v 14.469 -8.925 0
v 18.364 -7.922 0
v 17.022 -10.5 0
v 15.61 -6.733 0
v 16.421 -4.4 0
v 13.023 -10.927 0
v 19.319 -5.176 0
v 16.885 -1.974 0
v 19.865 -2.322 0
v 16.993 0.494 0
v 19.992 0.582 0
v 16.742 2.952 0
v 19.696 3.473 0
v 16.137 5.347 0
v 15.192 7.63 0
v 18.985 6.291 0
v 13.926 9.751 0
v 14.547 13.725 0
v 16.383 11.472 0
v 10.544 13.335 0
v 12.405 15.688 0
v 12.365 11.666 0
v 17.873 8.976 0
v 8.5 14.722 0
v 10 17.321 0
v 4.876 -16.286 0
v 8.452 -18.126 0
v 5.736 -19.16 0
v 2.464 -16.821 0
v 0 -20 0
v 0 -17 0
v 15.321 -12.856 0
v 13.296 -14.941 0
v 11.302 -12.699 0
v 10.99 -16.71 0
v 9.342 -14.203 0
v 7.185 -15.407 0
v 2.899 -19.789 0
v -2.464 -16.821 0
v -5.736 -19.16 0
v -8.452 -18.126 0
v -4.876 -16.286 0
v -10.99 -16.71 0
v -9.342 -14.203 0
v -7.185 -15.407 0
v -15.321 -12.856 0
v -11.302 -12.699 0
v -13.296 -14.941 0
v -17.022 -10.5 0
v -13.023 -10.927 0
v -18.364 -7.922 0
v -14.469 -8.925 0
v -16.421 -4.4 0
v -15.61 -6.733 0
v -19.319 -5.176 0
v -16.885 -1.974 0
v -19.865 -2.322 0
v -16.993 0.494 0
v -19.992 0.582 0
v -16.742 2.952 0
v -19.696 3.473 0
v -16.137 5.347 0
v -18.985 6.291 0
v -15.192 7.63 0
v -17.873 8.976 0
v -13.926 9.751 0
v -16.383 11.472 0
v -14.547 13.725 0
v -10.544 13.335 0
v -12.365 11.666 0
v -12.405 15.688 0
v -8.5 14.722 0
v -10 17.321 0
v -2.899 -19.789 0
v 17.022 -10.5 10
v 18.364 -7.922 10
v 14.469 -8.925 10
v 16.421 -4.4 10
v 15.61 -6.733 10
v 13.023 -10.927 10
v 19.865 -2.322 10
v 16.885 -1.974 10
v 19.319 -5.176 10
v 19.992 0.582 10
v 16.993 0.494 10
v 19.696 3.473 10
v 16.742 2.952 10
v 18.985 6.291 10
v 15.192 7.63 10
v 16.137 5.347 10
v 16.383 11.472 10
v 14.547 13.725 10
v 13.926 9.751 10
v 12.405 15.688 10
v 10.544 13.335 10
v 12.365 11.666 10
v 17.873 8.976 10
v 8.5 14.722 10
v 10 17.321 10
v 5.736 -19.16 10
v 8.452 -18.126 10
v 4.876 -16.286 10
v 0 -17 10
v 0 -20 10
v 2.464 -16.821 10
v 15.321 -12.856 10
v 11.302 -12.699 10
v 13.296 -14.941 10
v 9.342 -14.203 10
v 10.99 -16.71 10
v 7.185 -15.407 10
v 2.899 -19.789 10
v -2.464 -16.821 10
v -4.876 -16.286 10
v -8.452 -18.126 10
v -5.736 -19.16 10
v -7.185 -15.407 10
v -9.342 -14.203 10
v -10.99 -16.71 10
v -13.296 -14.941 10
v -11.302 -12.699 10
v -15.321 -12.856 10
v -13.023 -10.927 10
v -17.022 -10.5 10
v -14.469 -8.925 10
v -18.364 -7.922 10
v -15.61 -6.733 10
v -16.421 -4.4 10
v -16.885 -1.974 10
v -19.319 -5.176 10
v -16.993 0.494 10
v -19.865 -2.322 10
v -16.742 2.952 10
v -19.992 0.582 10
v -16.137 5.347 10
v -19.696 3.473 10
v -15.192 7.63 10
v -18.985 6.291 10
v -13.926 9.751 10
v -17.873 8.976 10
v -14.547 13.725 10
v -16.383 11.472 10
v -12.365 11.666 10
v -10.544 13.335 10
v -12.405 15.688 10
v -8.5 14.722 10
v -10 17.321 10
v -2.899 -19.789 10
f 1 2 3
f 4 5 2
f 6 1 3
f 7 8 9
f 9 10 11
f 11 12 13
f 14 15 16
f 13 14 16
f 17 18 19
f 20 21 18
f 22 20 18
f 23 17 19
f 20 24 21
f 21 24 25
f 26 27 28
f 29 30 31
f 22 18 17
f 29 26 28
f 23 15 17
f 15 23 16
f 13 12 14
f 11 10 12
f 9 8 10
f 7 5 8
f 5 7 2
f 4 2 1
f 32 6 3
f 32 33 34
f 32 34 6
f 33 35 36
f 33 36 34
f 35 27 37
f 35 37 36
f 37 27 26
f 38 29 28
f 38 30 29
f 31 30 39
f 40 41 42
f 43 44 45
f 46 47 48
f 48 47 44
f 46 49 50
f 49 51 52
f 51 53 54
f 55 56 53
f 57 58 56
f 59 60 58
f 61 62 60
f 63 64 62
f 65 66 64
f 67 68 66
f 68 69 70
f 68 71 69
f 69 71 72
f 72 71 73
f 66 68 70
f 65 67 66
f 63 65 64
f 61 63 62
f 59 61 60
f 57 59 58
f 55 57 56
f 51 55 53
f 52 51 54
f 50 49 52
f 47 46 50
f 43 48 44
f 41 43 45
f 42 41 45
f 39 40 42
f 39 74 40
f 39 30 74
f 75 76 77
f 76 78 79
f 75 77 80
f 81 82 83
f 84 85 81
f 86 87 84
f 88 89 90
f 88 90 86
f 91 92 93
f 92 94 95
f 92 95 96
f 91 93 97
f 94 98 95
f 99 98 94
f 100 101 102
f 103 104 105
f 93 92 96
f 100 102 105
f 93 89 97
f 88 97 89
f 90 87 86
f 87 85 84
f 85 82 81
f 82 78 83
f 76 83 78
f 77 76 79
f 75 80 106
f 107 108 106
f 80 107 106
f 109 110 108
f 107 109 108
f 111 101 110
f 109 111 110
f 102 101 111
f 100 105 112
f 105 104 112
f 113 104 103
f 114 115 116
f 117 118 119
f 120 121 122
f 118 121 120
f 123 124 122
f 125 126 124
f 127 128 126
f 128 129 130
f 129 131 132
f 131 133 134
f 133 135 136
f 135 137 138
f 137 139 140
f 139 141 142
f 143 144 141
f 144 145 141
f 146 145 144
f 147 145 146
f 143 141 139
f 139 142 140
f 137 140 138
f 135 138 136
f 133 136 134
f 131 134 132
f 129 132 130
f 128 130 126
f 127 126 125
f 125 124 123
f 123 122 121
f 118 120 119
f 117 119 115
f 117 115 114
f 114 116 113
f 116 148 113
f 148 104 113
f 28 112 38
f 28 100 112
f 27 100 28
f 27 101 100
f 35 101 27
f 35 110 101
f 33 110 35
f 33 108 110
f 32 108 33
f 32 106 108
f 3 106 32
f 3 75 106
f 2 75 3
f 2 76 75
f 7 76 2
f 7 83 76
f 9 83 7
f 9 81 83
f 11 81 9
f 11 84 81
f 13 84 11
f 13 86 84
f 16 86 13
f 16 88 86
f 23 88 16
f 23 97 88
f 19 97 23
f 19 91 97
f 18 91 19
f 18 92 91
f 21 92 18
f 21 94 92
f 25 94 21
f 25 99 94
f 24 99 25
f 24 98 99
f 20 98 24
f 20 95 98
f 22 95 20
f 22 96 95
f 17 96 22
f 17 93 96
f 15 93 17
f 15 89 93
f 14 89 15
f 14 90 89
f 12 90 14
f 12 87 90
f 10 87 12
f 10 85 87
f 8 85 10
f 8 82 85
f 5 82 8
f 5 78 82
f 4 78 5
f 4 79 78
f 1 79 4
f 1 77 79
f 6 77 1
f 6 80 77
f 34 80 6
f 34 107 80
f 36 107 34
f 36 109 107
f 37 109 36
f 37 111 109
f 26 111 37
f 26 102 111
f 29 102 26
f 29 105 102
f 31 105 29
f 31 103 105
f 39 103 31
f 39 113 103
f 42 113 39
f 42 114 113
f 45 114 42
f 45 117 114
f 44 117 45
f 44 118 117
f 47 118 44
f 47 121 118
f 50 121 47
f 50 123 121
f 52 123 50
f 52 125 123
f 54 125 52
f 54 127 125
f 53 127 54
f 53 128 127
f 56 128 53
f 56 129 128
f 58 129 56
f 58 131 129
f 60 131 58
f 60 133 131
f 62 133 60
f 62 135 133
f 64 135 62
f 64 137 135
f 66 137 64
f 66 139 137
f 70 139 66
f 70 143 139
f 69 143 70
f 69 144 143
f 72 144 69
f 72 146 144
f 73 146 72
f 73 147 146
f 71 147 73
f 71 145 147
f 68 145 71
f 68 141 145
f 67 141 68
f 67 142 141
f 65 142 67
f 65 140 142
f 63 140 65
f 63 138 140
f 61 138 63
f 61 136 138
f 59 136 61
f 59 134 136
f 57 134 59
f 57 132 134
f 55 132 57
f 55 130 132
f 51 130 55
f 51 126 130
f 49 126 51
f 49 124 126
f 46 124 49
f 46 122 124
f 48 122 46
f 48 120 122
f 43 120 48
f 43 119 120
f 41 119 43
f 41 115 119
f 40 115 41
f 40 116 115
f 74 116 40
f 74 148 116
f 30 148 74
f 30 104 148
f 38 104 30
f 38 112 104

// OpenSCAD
$fn = 32;

// ----------------------------------------------------------------------
// Spring clip: 40 mm outside, 3 mm band, 60 degree opening
// ----------------------------------------------------------------------

// --- parameters (mm) ---
outer_r = 20;             // clip outside radius
inner_r = 17;             // clip bore radius
band = 3;                 // band thickness
clip_w = 10;              // clip width
opening = 60;             // opening angle

clip_profile = [[-10, 17.321], [-12.405, 15.688], [-14.547, 13.725], [-16.383, 11.472], [-17.873, 8.976], [-18.985, 6.291], [-19.696, 3.473], [-19.992, 0.582], [-19.865, -2.322], [-19.319, -5.176], [-18.364, -7.922], [-17.022, -10.5], [-15.321, -12.856], [-13.296, -14.941], [-10.99, -16.71], [-8.452, -18.126], [-5.736, -19.16], [-2.899, -19.789], [0, -20], [2.899, -19.789], [5.736, -19.16], [8.452, -18.126], [10.99, -16.71], [13.296, -14.941], [15.321, -12.856], [17.022, -10.5], [18.364, -7.922], [19.319, -5.176], [19.865, -2.322], [19.992, 0.582], [19.696, 3.473], [18.985, 6.291], [17.873, 8.976], [16.383, 11.472], [14.547, 13.725], [12.405, 15.688], [10, 17.321], [8.5, 14.722], [10.544, 13.335], [12.365, 11.666], [13.926, 9.751], [15.192, 7.63], [16.137, 5.347], [16.742, 2.952], [16.993, 0.494], [16.885, -1.974], [16.421, -4.4], [15.61, -6.733], [14.469, -8.925], [13.023, -10.927], [11.302, -12.699], [9.342, -14.203], [7.185, -15.407], [4.876, -16.286], [2.464, -16.821], [0, -17], [-2.464, -16.821], [-4.876, -16.286], [-7.185, -15.407], [-9.342, -14.203], [-11.302, -12.699], [-13.023, -10.927], [-14.469, -8.925], [-15.61, -6.733], [-16.421, -4.4], [-16.885, -1.974], [-16.993, 0.494], [-16.742, 2.952], [-16.137, 5.347], [-15.192, 7.63], [-13.926, 9.751], [-12.365, 11.666], [-10.544, 13.335], [-8.5, 14.722]];

difference() {
  union() {
    linear_extrude(height = clip_w) polygon(clip_profile);
  }
}
